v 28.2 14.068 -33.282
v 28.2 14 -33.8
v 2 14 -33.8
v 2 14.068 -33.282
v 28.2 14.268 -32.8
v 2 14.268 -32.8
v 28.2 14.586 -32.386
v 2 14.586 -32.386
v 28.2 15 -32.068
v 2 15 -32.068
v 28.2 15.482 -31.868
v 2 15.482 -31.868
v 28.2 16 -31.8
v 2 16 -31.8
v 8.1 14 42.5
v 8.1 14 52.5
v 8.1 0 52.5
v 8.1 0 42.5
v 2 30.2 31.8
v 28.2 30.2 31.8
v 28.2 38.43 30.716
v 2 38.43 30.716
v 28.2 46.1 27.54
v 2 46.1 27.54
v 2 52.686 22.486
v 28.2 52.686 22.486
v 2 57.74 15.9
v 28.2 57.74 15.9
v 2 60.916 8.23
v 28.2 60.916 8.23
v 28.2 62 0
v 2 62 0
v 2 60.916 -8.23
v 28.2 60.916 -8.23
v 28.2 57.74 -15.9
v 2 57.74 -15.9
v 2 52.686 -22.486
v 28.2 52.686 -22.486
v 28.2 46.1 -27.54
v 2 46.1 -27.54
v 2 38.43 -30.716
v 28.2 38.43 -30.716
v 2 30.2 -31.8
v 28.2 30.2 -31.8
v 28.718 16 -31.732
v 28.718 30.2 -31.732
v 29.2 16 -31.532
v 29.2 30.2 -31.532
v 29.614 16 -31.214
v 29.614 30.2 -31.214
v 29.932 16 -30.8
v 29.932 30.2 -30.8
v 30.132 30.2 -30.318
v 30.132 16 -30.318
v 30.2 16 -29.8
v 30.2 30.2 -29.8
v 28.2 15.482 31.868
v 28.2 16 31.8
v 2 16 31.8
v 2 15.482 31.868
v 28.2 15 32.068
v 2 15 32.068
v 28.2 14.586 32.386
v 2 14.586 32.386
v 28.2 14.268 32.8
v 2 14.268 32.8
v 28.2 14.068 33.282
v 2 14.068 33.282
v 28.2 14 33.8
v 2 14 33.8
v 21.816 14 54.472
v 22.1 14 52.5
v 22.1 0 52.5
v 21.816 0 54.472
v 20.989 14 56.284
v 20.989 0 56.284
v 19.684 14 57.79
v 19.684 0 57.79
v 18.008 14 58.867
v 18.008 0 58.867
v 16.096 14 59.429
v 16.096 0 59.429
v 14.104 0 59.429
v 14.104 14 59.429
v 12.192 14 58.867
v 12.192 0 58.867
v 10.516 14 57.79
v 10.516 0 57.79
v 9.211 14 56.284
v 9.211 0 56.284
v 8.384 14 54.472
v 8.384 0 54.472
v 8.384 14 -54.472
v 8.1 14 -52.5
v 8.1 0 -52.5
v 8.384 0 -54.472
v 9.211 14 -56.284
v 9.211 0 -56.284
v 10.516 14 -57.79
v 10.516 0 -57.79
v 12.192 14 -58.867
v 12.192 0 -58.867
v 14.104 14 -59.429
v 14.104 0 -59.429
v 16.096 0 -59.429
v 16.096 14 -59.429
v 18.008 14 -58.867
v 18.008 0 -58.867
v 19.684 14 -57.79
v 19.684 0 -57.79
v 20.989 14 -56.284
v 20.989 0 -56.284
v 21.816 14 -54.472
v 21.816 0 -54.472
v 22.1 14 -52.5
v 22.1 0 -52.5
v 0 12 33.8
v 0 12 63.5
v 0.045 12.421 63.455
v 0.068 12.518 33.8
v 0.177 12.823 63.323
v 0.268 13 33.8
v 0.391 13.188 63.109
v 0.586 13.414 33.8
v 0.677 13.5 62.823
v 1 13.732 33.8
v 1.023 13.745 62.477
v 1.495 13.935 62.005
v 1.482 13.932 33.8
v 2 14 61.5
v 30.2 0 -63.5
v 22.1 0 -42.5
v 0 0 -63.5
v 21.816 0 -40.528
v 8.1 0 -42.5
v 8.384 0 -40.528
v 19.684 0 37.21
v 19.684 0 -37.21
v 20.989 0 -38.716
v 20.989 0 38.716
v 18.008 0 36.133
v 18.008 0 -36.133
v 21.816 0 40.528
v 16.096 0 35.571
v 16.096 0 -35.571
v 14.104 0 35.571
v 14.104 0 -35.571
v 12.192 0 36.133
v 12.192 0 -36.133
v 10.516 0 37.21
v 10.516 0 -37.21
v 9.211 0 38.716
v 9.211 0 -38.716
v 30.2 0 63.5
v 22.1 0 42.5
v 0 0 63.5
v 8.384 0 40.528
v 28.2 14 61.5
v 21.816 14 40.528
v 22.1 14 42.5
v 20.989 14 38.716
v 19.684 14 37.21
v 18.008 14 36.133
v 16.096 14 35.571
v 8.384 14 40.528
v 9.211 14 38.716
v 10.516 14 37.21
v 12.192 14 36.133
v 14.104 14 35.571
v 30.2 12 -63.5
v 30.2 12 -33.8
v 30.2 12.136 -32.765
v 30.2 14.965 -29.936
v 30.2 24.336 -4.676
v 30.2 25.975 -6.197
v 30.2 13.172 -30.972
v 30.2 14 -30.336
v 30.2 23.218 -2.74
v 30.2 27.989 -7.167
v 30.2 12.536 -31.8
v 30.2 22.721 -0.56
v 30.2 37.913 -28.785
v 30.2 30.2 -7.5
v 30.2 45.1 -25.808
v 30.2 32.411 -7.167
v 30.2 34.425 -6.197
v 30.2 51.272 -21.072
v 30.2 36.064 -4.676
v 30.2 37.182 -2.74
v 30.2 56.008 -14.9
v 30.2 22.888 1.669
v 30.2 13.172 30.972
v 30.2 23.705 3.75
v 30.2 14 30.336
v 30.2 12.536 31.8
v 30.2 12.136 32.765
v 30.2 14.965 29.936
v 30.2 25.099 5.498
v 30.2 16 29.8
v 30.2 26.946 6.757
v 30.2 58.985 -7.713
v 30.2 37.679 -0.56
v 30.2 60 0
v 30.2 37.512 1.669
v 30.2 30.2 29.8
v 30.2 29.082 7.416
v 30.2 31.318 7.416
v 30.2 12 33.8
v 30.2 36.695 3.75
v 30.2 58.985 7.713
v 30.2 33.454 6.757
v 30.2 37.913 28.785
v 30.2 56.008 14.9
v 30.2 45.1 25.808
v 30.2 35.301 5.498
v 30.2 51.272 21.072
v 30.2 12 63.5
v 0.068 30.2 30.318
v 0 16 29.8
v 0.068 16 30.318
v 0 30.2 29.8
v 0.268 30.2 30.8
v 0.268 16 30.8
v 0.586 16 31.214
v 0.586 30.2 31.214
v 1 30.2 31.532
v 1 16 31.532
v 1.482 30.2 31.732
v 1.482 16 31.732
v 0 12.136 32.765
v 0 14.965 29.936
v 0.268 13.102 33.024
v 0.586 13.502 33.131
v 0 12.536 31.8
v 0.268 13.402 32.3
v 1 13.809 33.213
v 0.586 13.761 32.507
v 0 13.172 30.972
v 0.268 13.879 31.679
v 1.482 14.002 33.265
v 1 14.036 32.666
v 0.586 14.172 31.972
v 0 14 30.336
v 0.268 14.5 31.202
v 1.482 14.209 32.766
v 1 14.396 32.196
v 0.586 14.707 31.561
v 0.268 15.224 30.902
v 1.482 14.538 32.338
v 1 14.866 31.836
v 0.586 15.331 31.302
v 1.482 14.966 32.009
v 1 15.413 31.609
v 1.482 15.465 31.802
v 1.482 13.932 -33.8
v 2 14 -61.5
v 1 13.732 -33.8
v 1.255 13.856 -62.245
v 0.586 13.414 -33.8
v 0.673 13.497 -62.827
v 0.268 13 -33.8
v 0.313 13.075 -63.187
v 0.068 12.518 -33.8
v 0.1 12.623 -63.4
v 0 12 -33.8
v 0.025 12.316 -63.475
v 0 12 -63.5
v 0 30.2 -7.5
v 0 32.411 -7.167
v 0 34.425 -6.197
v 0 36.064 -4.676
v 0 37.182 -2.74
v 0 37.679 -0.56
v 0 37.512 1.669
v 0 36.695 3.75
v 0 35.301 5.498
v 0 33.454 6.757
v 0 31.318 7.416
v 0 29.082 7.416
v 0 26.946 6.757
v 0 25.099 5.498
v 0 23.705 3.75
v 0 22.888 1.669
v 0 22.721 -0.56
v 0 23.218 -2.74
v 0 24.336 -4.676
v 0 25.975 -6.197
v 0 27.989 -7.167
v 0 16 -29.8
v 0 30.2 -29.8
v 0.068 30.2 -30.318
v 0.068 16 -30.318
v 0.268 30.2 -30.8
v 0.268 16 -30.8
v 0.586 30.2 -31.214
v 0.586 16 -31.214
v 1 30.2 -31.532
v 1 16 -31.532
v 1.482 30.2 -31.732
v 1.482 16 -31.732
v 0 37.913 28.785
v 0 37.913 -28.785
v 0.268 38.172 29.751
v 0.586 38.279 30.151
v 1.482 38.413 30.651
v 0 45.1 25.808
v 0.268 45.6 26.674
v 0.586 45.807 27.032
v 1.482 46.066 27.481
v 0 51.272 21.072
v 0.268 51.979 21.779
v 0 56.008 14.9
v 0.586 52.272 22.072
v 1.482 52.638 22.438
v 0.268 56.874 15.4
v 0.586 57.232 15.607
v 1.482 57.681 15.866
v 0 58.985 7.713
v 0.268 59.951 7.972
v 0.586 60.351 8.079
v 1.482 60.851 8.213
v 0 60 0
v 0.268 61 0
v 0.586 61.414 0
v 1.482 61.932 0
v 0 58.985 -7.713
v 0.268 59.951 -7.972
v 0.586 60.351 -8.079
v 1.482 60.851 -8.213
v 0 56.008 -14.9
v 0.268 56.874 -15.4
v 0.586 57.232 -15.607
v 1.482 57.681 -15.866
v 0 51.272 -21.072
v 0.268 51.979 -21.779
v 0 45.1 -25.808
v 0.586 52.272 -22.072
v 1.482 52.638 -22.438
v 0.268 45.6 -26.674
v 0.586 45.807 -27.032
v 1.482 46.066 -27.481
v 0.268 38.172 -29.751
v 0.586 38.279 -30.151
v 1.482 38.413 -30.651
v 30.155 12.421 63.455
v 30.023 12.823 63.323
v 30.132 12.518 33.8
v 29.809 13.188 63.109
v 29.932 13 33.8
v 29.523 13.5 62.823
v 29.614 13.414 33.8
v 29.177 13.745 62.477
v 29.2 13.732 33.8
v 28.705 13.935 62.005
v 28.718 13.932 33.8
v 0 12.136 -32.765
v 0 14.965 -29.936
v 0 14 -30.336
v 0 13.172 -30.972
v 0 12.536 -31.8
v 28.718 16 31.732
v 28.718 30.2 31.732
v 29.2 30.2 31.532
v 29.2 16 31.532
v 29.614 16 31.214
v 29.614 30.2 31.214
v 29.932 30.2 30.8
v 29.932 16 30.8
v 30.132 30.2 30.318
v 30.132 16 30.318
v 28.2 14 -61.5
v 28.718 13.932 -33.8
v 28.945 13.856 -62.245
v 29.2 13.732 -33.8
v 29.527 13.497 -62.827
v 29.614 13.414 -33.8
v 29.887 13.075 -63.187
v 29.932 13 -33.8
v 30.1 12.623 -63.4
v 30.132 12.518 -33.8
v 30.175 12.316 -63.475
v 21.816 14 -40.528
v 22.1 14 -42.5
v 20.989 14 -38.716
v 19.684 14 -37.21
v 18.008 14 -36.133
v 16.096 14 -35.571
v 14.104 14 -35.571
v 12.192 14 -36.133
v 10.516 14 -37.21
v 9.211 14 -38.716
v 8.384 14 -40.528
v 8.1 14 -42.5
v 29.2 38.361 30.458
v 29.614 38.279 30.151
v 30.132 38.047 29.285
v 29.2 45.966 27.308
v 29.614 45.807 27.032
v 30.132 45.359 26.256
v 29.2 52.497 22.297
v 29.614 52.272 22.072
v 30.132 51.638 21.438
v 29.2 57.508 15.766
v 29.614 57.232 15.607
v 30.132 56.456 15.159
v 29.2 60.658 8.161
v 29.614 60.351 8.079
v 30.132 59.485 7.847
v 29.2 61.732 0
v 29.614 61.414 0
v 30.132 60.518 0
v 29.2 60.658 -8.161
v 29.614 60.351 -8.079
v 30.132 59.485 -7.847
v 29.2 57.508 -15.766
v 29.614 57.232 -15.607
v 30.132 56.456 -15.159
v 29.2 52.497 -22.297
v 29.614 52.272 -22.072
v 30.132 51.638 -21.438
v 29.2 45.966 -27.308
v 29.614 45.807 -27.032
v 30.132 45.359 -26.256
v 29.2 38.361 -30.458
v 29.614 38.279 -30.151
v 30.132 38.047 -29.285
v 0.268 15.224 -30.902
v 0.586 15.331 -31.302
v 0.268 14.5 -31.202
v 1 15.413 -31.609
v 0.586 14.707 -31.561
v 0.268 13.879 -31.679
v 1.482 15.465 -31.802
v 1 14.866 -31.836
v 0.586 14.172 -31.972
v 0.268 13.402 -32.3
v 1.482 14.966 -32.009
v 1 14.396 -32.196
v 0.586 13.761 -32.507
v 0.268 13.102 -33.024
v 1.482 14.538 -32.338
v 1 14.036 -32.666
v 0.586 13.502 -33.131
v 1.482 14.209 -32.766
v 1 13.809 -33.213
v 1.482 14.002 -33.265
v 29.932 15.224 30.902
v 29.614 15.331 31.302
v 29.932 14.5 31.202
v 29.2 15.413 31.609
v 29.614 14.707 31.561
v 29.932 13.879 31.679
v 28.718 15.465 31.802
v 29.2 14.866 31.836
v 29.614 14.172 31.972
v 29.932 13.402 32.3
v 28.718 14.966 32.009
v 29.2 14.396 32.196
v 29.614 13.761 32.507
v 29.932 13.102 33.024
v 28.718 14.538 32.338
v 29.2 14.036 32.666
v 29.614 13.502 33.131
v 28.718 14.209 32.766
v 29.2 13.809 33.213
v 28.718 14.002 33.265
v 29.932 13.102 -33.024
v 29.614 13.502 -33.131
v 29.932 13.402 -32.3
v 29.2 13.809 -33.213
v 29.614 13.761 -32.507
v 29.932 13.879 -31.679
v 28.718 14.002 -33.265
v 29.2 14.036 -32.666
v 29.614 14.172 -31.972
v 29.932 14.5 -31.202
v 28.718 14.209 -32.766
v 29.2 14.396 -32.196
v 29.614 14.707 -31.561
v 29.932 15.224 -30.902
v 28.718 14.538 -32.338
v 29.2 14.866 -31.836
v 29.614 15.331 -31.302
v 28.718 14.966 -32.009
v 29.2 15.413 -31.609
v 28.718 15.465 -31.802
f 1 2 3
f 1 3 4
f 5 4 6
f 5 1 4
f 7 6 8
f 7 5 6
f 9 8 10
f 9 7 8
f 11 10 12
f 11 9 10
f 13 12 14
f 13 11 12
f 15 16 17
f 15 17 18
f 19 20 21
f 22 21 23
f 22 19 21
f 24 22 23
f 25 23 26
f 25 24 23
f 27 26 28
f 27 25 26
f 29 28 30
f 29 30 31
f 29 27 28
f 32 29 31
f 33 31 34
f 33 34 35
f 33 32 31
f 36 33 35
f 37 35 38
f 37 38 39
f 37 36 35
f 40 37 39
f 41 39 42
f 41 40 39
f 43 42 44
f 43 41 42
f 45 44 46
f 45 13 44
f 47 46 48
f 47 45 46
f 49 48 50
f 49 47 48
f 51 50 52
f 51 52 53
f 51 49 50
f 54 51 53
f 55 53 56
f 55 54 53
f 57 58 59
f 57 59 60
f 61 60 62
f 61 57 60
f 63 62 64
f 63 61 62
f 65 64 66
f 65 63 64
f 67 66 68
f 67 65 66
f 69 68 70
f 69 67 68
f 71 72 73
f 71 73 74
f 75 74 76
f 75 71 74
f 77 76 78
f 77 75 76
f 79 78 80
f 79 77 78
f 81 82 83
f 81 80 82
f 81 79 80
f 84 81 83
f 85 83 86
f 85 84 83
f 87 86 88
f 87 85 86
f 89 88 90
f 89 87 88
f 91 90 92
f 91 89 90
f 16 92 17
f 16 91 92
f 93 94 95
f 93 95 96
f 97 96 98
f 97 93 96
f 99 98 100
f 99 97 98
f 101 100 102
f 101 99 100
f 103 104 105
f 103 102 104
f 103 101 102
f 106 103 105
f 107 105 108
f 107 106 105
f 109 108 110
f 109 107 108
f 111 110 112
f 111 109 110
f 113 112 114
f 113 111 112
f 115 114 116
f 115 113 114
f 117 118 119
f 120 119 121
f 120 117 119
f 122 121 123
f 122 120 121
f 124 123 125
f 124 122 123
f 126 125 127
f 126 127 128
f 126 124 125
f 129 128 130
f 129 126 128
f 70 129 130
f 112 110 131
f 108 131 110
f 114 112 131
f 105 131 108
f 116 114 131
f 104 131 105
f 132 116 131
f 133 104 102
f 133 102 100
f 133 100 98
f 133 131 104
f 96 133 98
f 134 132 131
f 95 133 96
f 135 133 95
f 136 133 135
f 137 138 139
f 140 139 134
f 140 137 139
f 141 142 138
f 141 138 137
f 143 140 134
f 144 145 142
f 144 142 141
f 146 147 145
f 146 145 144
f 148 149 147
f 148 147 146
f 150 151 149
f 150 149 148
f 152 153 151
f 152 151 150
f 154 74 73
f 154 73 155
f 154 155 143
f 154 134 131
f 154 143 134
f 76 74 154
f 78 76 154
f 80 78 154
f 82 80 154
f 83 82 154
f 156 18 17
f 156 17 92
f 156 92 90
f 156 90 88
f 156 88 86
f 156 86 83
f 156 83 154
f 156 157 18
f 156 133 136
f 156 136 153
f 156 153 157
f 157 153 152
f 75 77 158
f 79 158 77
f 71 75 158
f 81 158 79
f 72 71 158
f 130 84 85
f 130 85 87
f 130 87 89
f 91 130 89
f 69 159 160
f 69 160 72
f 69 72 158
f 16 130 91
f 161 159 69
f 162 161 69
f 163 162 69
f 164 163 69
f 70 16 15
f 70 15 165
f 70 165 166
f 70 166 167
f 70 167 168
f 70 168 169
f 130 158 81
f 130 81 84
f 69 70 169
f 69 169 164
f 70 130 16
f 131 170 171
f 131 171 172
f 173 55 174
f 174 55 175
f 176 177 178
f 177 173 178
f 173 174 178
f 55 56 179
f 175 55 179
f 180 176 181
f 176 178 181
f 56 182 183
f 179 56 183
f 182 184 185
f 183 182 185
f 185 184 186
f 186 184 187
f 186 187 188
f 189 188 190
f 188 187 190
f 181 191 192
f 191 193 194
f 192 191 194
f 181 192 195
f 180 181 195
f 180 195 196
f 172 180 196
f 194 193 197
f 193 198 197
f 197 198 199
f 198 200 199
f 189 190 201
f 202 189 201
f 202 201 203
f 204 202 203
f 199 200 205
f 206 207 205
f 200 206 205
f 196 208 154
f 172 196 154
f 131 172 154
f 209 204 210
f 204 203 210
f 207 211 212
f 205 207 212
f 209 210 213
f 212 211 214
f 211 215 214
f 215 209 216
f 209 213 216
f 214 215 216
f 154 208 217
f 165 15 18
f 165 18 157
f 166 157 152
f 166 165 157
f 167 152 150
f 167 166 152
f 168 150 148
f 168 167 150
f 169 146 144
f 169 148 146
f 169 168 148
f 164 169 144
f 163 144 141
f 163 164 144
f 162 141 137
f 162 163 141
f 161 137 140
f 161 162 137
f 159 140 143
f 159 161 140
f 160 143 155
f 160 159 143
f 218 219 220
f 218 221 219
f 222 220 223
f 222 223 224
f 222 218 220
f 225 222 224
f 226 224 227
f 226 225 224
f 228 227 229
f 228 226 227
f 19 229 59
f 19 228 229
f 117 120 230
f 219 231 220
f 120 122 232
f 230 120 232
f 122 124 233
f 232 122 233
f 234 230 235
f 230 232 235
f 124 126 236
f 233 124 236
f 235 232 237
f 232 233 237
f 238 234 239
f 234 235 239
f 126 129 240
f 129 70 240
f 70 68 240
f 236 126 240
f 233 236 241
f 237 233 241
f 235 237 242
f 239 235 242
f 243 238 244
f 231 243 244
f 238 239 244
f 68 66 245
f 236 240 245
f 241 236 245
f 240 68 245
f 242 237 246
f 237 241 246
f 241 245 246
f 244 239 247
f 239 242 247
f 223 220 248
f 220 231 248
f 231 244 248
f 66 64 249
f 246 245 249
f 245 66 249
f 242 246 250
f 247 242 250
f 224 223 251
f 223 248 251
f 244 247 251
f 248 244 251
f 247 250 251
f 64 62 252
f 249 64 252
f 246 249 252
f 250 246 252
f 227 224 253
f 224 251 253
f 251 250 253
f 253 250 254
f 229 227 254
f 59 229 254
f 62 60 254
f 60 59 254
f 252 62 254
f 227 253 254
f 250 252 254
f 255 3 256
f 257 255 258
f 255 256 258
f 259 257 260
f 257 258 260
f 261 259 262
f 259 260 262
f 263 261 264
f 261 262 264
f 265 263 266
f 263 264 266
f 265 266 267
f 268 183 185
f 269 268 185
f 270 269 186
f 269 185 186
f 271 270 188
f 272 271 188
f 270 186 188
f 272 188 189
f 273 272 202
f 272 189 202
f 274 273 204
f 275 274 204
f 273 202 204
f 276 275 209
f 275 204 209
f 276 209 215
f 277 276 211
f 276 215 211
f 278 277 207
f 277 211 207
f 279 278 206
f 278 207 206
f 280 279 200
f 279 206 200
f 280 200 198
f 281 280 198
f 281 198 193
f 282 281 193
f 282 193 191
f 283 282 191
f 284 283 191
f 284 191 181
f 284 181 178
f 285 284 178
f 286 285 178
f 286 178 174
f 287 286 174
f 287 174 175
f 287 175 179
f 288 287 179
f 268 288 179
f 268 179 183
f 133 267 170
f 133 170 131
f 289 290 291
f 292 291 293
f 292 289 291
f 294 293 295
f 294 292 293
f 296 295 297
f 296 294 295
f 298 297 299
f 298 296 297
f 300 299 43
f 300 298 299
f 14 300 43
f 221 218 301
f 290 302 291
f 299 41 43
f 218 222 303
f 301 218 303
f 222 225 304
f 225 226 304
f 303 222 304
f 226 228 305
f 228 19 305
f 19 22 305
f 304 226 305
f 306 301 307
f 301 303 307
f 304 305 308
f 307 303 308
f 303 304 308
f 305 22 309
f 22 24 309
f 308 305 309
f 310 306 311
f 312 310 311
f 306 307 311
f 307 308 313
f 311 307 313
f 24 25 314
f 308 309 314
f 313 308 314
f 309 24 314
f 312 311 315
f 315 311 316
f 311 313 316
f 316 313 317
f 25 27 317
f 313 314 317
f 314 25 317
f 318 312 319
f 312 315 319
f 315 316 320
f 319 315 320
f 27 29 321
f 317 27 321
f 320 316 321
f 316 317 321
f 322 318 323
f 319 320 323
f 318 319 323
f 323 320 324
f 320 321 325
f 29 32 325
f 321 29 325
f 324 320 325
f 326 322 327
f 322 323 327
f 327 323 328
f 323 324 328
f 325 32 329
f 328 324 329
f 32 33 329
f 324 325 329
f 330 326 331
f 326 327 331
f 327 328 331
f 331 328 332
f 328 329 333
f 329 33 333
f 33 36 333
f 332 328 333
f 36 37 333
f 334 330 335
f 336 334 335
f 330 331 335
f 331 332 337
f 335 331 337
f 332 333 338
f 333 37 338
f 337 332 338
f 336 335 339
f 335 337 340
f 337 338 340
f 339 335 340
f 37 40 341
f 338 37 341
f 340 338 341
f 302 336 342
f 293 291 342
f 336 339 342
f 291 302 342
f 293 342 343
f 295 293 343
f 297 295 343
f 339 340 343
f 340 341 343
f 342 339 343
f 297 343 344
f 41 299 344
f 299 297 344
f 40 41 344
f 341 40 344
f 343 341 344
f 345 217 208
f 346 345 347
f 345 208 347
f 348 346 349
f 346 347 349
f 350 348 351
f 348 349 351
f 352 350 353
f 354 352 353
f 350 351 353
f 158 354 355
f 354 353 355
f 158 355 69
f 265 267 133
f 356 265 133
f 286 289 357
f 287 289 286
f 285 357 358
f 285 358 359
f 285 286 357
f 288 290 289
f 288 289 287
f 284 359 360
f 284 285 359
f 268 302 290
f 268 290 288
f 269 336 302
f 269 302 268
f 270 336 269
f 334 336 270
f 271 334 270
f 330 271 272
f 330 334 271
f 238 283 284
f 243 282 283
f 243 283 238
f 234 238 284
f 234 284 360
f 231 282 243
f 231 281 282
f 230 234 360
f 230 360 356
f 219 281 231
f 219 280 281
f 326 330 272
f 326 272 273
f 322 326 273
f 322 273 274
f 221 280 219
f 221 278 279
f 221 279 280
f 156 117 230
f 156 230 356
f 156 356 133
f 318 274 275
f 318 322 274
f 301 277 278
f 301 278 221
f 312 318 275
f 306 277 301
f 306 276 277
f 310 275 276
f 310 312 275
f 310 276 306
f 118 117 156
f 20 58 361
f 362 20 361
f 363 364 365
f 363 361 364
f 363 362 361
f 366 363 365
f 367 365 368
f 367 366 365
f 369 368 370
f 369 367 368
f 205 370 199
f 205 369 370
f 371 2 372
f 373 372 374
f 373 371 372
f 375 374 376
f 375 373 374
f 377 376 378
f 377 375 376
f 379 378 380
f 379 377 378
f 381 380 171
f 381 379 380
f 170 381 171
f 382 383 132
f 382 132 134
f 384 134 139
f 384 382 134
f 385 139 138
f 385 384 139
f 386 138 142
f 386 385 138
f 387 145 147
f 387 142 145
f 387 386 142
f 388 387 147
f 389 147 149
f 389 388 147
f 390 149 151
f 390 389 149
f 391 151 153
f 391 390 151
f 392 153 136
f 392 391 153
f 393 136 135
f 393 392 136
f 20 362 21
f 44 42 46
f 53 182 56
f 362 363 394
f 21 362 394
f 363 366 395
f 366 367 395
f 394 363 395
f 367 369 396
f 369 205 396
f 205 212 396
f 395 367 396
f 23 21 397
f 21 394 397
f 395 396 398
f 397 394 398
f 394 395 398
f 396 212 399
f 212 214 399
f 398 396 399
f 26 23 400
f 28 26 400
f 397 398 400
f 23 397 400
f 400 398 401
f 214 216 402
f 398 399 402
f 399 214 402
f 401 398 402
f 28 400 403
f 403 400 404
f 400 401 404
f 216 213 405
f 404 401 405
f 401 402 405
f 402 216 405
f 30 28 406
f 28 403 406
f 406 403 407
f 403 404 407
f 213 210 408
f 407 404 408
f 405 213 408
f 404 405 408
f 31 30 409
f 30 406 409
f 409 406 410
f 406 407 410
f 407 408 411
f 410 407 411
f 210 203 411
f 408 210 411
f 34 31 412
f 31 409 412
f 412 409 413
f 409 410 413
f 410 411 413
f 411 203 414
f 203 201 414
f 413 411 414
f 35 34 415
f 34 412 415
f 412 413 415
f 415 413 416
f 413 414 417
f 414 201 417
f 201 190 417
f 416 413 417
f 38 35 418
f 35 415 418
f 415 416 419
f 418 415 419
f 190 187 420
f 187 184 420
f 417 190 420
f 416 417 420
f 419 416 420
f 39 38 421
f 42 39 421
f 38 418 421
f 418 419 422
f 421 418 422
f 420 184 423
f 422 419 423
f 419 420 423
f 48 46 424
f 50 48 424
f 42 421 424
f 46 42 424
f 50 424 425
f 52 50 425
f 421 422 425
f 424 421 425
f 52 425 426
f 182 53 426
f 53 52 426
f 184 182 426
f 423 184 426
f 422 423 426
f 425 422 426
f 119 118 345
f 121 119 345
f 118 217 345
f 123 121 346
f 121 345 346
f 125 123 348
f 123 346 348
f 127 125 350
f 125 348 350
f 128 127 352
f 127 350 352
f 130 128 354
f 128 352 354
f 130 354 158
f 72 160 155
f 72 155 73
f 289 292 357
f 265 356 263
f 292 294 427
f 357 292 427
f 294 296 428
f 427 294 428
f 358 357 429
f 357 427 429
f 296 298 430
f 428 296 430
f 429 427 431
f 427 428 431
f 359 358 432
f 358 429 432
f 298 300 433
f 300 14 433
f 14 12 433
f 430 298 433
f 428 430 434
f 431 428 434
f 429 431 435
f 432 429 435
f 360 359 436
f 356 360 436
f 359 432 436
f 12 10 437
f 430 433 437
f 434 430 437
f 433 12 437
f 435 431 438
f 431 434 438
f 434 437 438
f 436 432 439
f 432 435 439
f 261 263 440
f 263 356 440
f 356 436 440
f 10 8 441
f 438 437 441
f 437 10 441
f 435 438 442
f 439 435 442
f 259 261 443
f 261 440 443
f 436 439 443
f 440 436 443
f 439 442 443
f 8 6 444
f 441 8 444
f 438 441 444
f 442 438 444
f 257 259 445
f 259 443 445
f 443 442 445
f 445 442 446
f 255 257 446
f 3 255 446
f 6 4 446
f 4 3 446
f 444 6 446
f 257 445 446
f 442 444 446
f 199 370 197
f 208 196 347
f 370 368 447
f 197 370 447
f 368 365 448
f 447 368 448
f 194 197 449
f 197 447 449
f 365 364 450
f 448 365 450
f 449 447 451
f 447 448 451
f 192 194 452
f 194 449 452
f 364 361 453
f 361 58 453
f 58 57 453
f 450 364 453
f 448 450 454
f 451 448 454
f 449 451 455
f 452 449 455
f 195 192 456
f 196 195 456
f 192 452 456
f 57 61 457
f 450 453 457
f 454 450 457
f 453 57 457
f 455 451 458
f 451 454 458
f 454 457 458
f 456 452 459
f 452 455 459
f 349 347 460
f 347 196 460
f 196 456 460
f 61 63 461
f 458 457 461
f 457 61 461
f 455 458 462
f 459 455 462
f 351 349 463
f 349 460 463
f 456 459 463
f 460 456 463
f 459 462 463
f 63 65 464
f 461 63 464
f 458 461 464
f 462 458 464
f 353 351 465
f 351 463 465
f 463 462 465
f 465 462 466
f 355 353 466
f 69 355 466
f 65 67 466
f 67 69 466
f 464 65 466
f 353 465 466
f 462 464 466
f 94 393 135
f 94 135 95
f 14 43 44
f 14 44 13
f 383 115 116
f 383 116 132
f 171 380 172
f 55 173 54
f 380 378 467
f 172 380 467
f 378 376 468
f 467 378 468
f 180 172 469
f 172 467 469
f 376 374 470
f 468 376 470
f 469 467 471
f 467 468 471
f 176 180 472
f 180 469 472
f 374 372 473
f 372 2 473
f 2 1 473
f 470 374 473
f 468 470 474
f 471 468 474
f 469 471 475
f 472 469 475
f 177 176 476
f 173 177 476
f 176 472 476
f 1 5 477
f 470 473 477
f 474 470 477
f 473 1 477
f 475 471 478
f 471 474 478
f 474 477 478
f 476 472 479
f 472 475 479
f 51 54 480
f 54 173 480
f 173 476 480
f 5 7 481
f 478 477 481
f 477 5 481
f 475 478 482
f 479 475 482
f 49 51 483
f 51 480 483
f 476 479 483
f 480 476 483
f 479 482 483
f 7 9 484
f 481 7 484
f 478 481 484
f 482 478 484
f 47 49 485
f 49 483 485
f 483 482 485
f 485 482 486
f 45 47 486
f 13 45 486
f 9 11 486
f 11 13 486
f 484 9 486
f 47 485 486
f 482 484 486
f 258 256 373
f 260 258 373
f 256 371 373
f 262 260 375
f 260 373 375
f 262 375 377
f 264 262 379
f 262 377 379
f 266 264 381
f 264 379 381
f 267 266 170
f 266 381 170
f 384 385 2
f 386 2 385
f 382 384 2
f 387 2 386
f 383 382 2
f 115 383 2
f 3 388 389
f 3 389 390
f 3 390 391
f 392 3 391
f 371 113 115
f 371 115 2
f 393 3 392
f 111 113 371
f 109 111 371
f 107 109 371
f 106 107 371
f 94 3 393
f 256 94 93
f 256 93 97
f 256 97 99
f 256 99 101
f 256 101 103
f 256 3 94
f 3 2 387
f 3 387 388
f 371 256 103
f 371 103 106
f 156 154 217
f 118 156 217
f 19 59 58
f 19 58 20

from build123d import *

# Parameters (mm, degrees)
DODANIE_WYCI_GNI_CIE1_DEPTH = 30.2
SZKIC2_R                    = 7.5
WYTNIJ_WYCI_GNI_CIE1_DEPTH  = 94.745879909
ZAOKR_GLENIE1_R             = 2
WYTNIJ_WYCI_GNI_CIE2_REACH  = 87.137


with BuildPart() as part:
    # Szkic1 → Dodanie-wyciągnięcie1 (new body)
    with BuildSketch(Plane(origin=(0, 0, 0), x_dir=(0, 0, -1), z_dir=(1, 0, 0))):
        with BuildLine():
            Line((31.8, 14), (63.5, 14))
            Line((63.5, 14), (63.5, 0))
            Line((63.5, 0), (-63.5, 0))
            Line((-63.5, 0), (-63.5, 14))
            Line((-63.5, 14), (-31.8, 14))
            Line((-31.8, 14), (-31.8, 30.2))
            ThreePointArc((-31.8, 30.2), (0, 62), (31.8, 30.2))
            Line((31.8, 30.2), (31.8, 14))
        make_face()
    extrude(amount=DODANIE_WYCI_GNI_CIE1_DEPTH)

    # Szkic2 → Wytnij-wyciągnięcie1 (cut, through all)
    with BuildSketch(Plane(origin=(30.2, 0, 0), x_dir=(0, 0, -1), z_dir=(1, 0, 0))):
        with Locations((0, 30.2)):
            Circle(SZKIC2_R)
    extrude(amount=-WYTNIJ_WYCI_GNI_CIE1_DEPTH, mode=Mode.SUBTRACT)

    # Zaokrąglenie1
    zaokr_glenie1_edges = [part.edges().sort_by_distance(p)[0] for p in [
        (0, 14, -47.65),
        (15.1, 14, 63.5),
        (15.1, 14, 31.8),
        (15.1, 14, -31.8),
        (15.1, 14, -63.5),
        (30.2, 14, -47.65),
        (30.2, 22.1, -31.8),
        (30.2, 62, 0),
        (30.2, 22.1, 31.8),
        (30.2, 14, 47.65),
        (0, 14, 47.65),
        (0, 22.1, 31.8),
        (0, 62, 0),
        (0, 22.1, -31.8),
    ]]
    fillet(zaokr_glenie1_edges, radius=ZAOKR_GLENIE1_R)

    # Szkic3 → Wytnij-wyciągnięcie2 (cut, up to next)
    with BuildSketch(Plane(origin=(0, 14, 0), x_dir=(1, 0, 0), z_dir=(0, 1, 0)), mode=Mode.PRIVATE) as wytnij_wyci_gni_cie2_sk1:
        with BuildLine():
            Line((8.1, -52.5), (8.1, -42.5))
            ThreePointArc((8.1, -42.5), (15.1, -35.5), (22.1, -42.5))
            Line((22.1, -42.5), (22.1, -52.5))
            ThreePointArc((22.1, -52.5), (15.1, -59.5), (8.1, -52.5))
        make_face()
    wytnij_wyci_gni_cie2_tool1 = extrude(wytnij_wyci_gni_cie2_sk1.sketch, amount=-WYTNIJ_WYCI_GNI_CIE2_REACH, mode=Mode.PRIVATE) & part.part
    # Szkic3 → Wytnij-wyciągnięcie2 (cut, up to next)
    with BuildSketch(Plane(origin=(0, 14, 0), x_dir=(1, 0, 0), z_dir=(0, 1, 0)), mode=Mode.PRIVATE) as wytnij_wyci_gni_cie2_sk2:
        with BuildLine():
            Line((8.1, 42.5), (8.1, 52.5))
            ThreePointArc((8.1, 52.5), (15.1, 59.5), (22.1, 52.5))
            Line((22.1, 52.5), (22.1, 42.5))
            ThreePointArc((22.1, 42.5), (15.1, 35.5), (8.1, 42.5))
        make_face()
    wytnij_wyci_gni_cie2_tool2 = extrude(wytnij_wyci_gni_cie2_sk2.sketch, amount=-WYTNIJ_WYCI_GNI_CIE2_REACH, mode=Mode.PRIVATE) & part.part
    add(wytnij_wyci_gni_cie2_tool1.solids().sort_by_distance((15.1, 14, 47.5))[0], mode=Mode.SUBTRACT)
    add(wytnij_wyci_gni_cie2_tool2.solids().sort_by_distance((15.1, 14, -47.5))[0], mode=Mode.SUBTRACT)


solid = part.part
